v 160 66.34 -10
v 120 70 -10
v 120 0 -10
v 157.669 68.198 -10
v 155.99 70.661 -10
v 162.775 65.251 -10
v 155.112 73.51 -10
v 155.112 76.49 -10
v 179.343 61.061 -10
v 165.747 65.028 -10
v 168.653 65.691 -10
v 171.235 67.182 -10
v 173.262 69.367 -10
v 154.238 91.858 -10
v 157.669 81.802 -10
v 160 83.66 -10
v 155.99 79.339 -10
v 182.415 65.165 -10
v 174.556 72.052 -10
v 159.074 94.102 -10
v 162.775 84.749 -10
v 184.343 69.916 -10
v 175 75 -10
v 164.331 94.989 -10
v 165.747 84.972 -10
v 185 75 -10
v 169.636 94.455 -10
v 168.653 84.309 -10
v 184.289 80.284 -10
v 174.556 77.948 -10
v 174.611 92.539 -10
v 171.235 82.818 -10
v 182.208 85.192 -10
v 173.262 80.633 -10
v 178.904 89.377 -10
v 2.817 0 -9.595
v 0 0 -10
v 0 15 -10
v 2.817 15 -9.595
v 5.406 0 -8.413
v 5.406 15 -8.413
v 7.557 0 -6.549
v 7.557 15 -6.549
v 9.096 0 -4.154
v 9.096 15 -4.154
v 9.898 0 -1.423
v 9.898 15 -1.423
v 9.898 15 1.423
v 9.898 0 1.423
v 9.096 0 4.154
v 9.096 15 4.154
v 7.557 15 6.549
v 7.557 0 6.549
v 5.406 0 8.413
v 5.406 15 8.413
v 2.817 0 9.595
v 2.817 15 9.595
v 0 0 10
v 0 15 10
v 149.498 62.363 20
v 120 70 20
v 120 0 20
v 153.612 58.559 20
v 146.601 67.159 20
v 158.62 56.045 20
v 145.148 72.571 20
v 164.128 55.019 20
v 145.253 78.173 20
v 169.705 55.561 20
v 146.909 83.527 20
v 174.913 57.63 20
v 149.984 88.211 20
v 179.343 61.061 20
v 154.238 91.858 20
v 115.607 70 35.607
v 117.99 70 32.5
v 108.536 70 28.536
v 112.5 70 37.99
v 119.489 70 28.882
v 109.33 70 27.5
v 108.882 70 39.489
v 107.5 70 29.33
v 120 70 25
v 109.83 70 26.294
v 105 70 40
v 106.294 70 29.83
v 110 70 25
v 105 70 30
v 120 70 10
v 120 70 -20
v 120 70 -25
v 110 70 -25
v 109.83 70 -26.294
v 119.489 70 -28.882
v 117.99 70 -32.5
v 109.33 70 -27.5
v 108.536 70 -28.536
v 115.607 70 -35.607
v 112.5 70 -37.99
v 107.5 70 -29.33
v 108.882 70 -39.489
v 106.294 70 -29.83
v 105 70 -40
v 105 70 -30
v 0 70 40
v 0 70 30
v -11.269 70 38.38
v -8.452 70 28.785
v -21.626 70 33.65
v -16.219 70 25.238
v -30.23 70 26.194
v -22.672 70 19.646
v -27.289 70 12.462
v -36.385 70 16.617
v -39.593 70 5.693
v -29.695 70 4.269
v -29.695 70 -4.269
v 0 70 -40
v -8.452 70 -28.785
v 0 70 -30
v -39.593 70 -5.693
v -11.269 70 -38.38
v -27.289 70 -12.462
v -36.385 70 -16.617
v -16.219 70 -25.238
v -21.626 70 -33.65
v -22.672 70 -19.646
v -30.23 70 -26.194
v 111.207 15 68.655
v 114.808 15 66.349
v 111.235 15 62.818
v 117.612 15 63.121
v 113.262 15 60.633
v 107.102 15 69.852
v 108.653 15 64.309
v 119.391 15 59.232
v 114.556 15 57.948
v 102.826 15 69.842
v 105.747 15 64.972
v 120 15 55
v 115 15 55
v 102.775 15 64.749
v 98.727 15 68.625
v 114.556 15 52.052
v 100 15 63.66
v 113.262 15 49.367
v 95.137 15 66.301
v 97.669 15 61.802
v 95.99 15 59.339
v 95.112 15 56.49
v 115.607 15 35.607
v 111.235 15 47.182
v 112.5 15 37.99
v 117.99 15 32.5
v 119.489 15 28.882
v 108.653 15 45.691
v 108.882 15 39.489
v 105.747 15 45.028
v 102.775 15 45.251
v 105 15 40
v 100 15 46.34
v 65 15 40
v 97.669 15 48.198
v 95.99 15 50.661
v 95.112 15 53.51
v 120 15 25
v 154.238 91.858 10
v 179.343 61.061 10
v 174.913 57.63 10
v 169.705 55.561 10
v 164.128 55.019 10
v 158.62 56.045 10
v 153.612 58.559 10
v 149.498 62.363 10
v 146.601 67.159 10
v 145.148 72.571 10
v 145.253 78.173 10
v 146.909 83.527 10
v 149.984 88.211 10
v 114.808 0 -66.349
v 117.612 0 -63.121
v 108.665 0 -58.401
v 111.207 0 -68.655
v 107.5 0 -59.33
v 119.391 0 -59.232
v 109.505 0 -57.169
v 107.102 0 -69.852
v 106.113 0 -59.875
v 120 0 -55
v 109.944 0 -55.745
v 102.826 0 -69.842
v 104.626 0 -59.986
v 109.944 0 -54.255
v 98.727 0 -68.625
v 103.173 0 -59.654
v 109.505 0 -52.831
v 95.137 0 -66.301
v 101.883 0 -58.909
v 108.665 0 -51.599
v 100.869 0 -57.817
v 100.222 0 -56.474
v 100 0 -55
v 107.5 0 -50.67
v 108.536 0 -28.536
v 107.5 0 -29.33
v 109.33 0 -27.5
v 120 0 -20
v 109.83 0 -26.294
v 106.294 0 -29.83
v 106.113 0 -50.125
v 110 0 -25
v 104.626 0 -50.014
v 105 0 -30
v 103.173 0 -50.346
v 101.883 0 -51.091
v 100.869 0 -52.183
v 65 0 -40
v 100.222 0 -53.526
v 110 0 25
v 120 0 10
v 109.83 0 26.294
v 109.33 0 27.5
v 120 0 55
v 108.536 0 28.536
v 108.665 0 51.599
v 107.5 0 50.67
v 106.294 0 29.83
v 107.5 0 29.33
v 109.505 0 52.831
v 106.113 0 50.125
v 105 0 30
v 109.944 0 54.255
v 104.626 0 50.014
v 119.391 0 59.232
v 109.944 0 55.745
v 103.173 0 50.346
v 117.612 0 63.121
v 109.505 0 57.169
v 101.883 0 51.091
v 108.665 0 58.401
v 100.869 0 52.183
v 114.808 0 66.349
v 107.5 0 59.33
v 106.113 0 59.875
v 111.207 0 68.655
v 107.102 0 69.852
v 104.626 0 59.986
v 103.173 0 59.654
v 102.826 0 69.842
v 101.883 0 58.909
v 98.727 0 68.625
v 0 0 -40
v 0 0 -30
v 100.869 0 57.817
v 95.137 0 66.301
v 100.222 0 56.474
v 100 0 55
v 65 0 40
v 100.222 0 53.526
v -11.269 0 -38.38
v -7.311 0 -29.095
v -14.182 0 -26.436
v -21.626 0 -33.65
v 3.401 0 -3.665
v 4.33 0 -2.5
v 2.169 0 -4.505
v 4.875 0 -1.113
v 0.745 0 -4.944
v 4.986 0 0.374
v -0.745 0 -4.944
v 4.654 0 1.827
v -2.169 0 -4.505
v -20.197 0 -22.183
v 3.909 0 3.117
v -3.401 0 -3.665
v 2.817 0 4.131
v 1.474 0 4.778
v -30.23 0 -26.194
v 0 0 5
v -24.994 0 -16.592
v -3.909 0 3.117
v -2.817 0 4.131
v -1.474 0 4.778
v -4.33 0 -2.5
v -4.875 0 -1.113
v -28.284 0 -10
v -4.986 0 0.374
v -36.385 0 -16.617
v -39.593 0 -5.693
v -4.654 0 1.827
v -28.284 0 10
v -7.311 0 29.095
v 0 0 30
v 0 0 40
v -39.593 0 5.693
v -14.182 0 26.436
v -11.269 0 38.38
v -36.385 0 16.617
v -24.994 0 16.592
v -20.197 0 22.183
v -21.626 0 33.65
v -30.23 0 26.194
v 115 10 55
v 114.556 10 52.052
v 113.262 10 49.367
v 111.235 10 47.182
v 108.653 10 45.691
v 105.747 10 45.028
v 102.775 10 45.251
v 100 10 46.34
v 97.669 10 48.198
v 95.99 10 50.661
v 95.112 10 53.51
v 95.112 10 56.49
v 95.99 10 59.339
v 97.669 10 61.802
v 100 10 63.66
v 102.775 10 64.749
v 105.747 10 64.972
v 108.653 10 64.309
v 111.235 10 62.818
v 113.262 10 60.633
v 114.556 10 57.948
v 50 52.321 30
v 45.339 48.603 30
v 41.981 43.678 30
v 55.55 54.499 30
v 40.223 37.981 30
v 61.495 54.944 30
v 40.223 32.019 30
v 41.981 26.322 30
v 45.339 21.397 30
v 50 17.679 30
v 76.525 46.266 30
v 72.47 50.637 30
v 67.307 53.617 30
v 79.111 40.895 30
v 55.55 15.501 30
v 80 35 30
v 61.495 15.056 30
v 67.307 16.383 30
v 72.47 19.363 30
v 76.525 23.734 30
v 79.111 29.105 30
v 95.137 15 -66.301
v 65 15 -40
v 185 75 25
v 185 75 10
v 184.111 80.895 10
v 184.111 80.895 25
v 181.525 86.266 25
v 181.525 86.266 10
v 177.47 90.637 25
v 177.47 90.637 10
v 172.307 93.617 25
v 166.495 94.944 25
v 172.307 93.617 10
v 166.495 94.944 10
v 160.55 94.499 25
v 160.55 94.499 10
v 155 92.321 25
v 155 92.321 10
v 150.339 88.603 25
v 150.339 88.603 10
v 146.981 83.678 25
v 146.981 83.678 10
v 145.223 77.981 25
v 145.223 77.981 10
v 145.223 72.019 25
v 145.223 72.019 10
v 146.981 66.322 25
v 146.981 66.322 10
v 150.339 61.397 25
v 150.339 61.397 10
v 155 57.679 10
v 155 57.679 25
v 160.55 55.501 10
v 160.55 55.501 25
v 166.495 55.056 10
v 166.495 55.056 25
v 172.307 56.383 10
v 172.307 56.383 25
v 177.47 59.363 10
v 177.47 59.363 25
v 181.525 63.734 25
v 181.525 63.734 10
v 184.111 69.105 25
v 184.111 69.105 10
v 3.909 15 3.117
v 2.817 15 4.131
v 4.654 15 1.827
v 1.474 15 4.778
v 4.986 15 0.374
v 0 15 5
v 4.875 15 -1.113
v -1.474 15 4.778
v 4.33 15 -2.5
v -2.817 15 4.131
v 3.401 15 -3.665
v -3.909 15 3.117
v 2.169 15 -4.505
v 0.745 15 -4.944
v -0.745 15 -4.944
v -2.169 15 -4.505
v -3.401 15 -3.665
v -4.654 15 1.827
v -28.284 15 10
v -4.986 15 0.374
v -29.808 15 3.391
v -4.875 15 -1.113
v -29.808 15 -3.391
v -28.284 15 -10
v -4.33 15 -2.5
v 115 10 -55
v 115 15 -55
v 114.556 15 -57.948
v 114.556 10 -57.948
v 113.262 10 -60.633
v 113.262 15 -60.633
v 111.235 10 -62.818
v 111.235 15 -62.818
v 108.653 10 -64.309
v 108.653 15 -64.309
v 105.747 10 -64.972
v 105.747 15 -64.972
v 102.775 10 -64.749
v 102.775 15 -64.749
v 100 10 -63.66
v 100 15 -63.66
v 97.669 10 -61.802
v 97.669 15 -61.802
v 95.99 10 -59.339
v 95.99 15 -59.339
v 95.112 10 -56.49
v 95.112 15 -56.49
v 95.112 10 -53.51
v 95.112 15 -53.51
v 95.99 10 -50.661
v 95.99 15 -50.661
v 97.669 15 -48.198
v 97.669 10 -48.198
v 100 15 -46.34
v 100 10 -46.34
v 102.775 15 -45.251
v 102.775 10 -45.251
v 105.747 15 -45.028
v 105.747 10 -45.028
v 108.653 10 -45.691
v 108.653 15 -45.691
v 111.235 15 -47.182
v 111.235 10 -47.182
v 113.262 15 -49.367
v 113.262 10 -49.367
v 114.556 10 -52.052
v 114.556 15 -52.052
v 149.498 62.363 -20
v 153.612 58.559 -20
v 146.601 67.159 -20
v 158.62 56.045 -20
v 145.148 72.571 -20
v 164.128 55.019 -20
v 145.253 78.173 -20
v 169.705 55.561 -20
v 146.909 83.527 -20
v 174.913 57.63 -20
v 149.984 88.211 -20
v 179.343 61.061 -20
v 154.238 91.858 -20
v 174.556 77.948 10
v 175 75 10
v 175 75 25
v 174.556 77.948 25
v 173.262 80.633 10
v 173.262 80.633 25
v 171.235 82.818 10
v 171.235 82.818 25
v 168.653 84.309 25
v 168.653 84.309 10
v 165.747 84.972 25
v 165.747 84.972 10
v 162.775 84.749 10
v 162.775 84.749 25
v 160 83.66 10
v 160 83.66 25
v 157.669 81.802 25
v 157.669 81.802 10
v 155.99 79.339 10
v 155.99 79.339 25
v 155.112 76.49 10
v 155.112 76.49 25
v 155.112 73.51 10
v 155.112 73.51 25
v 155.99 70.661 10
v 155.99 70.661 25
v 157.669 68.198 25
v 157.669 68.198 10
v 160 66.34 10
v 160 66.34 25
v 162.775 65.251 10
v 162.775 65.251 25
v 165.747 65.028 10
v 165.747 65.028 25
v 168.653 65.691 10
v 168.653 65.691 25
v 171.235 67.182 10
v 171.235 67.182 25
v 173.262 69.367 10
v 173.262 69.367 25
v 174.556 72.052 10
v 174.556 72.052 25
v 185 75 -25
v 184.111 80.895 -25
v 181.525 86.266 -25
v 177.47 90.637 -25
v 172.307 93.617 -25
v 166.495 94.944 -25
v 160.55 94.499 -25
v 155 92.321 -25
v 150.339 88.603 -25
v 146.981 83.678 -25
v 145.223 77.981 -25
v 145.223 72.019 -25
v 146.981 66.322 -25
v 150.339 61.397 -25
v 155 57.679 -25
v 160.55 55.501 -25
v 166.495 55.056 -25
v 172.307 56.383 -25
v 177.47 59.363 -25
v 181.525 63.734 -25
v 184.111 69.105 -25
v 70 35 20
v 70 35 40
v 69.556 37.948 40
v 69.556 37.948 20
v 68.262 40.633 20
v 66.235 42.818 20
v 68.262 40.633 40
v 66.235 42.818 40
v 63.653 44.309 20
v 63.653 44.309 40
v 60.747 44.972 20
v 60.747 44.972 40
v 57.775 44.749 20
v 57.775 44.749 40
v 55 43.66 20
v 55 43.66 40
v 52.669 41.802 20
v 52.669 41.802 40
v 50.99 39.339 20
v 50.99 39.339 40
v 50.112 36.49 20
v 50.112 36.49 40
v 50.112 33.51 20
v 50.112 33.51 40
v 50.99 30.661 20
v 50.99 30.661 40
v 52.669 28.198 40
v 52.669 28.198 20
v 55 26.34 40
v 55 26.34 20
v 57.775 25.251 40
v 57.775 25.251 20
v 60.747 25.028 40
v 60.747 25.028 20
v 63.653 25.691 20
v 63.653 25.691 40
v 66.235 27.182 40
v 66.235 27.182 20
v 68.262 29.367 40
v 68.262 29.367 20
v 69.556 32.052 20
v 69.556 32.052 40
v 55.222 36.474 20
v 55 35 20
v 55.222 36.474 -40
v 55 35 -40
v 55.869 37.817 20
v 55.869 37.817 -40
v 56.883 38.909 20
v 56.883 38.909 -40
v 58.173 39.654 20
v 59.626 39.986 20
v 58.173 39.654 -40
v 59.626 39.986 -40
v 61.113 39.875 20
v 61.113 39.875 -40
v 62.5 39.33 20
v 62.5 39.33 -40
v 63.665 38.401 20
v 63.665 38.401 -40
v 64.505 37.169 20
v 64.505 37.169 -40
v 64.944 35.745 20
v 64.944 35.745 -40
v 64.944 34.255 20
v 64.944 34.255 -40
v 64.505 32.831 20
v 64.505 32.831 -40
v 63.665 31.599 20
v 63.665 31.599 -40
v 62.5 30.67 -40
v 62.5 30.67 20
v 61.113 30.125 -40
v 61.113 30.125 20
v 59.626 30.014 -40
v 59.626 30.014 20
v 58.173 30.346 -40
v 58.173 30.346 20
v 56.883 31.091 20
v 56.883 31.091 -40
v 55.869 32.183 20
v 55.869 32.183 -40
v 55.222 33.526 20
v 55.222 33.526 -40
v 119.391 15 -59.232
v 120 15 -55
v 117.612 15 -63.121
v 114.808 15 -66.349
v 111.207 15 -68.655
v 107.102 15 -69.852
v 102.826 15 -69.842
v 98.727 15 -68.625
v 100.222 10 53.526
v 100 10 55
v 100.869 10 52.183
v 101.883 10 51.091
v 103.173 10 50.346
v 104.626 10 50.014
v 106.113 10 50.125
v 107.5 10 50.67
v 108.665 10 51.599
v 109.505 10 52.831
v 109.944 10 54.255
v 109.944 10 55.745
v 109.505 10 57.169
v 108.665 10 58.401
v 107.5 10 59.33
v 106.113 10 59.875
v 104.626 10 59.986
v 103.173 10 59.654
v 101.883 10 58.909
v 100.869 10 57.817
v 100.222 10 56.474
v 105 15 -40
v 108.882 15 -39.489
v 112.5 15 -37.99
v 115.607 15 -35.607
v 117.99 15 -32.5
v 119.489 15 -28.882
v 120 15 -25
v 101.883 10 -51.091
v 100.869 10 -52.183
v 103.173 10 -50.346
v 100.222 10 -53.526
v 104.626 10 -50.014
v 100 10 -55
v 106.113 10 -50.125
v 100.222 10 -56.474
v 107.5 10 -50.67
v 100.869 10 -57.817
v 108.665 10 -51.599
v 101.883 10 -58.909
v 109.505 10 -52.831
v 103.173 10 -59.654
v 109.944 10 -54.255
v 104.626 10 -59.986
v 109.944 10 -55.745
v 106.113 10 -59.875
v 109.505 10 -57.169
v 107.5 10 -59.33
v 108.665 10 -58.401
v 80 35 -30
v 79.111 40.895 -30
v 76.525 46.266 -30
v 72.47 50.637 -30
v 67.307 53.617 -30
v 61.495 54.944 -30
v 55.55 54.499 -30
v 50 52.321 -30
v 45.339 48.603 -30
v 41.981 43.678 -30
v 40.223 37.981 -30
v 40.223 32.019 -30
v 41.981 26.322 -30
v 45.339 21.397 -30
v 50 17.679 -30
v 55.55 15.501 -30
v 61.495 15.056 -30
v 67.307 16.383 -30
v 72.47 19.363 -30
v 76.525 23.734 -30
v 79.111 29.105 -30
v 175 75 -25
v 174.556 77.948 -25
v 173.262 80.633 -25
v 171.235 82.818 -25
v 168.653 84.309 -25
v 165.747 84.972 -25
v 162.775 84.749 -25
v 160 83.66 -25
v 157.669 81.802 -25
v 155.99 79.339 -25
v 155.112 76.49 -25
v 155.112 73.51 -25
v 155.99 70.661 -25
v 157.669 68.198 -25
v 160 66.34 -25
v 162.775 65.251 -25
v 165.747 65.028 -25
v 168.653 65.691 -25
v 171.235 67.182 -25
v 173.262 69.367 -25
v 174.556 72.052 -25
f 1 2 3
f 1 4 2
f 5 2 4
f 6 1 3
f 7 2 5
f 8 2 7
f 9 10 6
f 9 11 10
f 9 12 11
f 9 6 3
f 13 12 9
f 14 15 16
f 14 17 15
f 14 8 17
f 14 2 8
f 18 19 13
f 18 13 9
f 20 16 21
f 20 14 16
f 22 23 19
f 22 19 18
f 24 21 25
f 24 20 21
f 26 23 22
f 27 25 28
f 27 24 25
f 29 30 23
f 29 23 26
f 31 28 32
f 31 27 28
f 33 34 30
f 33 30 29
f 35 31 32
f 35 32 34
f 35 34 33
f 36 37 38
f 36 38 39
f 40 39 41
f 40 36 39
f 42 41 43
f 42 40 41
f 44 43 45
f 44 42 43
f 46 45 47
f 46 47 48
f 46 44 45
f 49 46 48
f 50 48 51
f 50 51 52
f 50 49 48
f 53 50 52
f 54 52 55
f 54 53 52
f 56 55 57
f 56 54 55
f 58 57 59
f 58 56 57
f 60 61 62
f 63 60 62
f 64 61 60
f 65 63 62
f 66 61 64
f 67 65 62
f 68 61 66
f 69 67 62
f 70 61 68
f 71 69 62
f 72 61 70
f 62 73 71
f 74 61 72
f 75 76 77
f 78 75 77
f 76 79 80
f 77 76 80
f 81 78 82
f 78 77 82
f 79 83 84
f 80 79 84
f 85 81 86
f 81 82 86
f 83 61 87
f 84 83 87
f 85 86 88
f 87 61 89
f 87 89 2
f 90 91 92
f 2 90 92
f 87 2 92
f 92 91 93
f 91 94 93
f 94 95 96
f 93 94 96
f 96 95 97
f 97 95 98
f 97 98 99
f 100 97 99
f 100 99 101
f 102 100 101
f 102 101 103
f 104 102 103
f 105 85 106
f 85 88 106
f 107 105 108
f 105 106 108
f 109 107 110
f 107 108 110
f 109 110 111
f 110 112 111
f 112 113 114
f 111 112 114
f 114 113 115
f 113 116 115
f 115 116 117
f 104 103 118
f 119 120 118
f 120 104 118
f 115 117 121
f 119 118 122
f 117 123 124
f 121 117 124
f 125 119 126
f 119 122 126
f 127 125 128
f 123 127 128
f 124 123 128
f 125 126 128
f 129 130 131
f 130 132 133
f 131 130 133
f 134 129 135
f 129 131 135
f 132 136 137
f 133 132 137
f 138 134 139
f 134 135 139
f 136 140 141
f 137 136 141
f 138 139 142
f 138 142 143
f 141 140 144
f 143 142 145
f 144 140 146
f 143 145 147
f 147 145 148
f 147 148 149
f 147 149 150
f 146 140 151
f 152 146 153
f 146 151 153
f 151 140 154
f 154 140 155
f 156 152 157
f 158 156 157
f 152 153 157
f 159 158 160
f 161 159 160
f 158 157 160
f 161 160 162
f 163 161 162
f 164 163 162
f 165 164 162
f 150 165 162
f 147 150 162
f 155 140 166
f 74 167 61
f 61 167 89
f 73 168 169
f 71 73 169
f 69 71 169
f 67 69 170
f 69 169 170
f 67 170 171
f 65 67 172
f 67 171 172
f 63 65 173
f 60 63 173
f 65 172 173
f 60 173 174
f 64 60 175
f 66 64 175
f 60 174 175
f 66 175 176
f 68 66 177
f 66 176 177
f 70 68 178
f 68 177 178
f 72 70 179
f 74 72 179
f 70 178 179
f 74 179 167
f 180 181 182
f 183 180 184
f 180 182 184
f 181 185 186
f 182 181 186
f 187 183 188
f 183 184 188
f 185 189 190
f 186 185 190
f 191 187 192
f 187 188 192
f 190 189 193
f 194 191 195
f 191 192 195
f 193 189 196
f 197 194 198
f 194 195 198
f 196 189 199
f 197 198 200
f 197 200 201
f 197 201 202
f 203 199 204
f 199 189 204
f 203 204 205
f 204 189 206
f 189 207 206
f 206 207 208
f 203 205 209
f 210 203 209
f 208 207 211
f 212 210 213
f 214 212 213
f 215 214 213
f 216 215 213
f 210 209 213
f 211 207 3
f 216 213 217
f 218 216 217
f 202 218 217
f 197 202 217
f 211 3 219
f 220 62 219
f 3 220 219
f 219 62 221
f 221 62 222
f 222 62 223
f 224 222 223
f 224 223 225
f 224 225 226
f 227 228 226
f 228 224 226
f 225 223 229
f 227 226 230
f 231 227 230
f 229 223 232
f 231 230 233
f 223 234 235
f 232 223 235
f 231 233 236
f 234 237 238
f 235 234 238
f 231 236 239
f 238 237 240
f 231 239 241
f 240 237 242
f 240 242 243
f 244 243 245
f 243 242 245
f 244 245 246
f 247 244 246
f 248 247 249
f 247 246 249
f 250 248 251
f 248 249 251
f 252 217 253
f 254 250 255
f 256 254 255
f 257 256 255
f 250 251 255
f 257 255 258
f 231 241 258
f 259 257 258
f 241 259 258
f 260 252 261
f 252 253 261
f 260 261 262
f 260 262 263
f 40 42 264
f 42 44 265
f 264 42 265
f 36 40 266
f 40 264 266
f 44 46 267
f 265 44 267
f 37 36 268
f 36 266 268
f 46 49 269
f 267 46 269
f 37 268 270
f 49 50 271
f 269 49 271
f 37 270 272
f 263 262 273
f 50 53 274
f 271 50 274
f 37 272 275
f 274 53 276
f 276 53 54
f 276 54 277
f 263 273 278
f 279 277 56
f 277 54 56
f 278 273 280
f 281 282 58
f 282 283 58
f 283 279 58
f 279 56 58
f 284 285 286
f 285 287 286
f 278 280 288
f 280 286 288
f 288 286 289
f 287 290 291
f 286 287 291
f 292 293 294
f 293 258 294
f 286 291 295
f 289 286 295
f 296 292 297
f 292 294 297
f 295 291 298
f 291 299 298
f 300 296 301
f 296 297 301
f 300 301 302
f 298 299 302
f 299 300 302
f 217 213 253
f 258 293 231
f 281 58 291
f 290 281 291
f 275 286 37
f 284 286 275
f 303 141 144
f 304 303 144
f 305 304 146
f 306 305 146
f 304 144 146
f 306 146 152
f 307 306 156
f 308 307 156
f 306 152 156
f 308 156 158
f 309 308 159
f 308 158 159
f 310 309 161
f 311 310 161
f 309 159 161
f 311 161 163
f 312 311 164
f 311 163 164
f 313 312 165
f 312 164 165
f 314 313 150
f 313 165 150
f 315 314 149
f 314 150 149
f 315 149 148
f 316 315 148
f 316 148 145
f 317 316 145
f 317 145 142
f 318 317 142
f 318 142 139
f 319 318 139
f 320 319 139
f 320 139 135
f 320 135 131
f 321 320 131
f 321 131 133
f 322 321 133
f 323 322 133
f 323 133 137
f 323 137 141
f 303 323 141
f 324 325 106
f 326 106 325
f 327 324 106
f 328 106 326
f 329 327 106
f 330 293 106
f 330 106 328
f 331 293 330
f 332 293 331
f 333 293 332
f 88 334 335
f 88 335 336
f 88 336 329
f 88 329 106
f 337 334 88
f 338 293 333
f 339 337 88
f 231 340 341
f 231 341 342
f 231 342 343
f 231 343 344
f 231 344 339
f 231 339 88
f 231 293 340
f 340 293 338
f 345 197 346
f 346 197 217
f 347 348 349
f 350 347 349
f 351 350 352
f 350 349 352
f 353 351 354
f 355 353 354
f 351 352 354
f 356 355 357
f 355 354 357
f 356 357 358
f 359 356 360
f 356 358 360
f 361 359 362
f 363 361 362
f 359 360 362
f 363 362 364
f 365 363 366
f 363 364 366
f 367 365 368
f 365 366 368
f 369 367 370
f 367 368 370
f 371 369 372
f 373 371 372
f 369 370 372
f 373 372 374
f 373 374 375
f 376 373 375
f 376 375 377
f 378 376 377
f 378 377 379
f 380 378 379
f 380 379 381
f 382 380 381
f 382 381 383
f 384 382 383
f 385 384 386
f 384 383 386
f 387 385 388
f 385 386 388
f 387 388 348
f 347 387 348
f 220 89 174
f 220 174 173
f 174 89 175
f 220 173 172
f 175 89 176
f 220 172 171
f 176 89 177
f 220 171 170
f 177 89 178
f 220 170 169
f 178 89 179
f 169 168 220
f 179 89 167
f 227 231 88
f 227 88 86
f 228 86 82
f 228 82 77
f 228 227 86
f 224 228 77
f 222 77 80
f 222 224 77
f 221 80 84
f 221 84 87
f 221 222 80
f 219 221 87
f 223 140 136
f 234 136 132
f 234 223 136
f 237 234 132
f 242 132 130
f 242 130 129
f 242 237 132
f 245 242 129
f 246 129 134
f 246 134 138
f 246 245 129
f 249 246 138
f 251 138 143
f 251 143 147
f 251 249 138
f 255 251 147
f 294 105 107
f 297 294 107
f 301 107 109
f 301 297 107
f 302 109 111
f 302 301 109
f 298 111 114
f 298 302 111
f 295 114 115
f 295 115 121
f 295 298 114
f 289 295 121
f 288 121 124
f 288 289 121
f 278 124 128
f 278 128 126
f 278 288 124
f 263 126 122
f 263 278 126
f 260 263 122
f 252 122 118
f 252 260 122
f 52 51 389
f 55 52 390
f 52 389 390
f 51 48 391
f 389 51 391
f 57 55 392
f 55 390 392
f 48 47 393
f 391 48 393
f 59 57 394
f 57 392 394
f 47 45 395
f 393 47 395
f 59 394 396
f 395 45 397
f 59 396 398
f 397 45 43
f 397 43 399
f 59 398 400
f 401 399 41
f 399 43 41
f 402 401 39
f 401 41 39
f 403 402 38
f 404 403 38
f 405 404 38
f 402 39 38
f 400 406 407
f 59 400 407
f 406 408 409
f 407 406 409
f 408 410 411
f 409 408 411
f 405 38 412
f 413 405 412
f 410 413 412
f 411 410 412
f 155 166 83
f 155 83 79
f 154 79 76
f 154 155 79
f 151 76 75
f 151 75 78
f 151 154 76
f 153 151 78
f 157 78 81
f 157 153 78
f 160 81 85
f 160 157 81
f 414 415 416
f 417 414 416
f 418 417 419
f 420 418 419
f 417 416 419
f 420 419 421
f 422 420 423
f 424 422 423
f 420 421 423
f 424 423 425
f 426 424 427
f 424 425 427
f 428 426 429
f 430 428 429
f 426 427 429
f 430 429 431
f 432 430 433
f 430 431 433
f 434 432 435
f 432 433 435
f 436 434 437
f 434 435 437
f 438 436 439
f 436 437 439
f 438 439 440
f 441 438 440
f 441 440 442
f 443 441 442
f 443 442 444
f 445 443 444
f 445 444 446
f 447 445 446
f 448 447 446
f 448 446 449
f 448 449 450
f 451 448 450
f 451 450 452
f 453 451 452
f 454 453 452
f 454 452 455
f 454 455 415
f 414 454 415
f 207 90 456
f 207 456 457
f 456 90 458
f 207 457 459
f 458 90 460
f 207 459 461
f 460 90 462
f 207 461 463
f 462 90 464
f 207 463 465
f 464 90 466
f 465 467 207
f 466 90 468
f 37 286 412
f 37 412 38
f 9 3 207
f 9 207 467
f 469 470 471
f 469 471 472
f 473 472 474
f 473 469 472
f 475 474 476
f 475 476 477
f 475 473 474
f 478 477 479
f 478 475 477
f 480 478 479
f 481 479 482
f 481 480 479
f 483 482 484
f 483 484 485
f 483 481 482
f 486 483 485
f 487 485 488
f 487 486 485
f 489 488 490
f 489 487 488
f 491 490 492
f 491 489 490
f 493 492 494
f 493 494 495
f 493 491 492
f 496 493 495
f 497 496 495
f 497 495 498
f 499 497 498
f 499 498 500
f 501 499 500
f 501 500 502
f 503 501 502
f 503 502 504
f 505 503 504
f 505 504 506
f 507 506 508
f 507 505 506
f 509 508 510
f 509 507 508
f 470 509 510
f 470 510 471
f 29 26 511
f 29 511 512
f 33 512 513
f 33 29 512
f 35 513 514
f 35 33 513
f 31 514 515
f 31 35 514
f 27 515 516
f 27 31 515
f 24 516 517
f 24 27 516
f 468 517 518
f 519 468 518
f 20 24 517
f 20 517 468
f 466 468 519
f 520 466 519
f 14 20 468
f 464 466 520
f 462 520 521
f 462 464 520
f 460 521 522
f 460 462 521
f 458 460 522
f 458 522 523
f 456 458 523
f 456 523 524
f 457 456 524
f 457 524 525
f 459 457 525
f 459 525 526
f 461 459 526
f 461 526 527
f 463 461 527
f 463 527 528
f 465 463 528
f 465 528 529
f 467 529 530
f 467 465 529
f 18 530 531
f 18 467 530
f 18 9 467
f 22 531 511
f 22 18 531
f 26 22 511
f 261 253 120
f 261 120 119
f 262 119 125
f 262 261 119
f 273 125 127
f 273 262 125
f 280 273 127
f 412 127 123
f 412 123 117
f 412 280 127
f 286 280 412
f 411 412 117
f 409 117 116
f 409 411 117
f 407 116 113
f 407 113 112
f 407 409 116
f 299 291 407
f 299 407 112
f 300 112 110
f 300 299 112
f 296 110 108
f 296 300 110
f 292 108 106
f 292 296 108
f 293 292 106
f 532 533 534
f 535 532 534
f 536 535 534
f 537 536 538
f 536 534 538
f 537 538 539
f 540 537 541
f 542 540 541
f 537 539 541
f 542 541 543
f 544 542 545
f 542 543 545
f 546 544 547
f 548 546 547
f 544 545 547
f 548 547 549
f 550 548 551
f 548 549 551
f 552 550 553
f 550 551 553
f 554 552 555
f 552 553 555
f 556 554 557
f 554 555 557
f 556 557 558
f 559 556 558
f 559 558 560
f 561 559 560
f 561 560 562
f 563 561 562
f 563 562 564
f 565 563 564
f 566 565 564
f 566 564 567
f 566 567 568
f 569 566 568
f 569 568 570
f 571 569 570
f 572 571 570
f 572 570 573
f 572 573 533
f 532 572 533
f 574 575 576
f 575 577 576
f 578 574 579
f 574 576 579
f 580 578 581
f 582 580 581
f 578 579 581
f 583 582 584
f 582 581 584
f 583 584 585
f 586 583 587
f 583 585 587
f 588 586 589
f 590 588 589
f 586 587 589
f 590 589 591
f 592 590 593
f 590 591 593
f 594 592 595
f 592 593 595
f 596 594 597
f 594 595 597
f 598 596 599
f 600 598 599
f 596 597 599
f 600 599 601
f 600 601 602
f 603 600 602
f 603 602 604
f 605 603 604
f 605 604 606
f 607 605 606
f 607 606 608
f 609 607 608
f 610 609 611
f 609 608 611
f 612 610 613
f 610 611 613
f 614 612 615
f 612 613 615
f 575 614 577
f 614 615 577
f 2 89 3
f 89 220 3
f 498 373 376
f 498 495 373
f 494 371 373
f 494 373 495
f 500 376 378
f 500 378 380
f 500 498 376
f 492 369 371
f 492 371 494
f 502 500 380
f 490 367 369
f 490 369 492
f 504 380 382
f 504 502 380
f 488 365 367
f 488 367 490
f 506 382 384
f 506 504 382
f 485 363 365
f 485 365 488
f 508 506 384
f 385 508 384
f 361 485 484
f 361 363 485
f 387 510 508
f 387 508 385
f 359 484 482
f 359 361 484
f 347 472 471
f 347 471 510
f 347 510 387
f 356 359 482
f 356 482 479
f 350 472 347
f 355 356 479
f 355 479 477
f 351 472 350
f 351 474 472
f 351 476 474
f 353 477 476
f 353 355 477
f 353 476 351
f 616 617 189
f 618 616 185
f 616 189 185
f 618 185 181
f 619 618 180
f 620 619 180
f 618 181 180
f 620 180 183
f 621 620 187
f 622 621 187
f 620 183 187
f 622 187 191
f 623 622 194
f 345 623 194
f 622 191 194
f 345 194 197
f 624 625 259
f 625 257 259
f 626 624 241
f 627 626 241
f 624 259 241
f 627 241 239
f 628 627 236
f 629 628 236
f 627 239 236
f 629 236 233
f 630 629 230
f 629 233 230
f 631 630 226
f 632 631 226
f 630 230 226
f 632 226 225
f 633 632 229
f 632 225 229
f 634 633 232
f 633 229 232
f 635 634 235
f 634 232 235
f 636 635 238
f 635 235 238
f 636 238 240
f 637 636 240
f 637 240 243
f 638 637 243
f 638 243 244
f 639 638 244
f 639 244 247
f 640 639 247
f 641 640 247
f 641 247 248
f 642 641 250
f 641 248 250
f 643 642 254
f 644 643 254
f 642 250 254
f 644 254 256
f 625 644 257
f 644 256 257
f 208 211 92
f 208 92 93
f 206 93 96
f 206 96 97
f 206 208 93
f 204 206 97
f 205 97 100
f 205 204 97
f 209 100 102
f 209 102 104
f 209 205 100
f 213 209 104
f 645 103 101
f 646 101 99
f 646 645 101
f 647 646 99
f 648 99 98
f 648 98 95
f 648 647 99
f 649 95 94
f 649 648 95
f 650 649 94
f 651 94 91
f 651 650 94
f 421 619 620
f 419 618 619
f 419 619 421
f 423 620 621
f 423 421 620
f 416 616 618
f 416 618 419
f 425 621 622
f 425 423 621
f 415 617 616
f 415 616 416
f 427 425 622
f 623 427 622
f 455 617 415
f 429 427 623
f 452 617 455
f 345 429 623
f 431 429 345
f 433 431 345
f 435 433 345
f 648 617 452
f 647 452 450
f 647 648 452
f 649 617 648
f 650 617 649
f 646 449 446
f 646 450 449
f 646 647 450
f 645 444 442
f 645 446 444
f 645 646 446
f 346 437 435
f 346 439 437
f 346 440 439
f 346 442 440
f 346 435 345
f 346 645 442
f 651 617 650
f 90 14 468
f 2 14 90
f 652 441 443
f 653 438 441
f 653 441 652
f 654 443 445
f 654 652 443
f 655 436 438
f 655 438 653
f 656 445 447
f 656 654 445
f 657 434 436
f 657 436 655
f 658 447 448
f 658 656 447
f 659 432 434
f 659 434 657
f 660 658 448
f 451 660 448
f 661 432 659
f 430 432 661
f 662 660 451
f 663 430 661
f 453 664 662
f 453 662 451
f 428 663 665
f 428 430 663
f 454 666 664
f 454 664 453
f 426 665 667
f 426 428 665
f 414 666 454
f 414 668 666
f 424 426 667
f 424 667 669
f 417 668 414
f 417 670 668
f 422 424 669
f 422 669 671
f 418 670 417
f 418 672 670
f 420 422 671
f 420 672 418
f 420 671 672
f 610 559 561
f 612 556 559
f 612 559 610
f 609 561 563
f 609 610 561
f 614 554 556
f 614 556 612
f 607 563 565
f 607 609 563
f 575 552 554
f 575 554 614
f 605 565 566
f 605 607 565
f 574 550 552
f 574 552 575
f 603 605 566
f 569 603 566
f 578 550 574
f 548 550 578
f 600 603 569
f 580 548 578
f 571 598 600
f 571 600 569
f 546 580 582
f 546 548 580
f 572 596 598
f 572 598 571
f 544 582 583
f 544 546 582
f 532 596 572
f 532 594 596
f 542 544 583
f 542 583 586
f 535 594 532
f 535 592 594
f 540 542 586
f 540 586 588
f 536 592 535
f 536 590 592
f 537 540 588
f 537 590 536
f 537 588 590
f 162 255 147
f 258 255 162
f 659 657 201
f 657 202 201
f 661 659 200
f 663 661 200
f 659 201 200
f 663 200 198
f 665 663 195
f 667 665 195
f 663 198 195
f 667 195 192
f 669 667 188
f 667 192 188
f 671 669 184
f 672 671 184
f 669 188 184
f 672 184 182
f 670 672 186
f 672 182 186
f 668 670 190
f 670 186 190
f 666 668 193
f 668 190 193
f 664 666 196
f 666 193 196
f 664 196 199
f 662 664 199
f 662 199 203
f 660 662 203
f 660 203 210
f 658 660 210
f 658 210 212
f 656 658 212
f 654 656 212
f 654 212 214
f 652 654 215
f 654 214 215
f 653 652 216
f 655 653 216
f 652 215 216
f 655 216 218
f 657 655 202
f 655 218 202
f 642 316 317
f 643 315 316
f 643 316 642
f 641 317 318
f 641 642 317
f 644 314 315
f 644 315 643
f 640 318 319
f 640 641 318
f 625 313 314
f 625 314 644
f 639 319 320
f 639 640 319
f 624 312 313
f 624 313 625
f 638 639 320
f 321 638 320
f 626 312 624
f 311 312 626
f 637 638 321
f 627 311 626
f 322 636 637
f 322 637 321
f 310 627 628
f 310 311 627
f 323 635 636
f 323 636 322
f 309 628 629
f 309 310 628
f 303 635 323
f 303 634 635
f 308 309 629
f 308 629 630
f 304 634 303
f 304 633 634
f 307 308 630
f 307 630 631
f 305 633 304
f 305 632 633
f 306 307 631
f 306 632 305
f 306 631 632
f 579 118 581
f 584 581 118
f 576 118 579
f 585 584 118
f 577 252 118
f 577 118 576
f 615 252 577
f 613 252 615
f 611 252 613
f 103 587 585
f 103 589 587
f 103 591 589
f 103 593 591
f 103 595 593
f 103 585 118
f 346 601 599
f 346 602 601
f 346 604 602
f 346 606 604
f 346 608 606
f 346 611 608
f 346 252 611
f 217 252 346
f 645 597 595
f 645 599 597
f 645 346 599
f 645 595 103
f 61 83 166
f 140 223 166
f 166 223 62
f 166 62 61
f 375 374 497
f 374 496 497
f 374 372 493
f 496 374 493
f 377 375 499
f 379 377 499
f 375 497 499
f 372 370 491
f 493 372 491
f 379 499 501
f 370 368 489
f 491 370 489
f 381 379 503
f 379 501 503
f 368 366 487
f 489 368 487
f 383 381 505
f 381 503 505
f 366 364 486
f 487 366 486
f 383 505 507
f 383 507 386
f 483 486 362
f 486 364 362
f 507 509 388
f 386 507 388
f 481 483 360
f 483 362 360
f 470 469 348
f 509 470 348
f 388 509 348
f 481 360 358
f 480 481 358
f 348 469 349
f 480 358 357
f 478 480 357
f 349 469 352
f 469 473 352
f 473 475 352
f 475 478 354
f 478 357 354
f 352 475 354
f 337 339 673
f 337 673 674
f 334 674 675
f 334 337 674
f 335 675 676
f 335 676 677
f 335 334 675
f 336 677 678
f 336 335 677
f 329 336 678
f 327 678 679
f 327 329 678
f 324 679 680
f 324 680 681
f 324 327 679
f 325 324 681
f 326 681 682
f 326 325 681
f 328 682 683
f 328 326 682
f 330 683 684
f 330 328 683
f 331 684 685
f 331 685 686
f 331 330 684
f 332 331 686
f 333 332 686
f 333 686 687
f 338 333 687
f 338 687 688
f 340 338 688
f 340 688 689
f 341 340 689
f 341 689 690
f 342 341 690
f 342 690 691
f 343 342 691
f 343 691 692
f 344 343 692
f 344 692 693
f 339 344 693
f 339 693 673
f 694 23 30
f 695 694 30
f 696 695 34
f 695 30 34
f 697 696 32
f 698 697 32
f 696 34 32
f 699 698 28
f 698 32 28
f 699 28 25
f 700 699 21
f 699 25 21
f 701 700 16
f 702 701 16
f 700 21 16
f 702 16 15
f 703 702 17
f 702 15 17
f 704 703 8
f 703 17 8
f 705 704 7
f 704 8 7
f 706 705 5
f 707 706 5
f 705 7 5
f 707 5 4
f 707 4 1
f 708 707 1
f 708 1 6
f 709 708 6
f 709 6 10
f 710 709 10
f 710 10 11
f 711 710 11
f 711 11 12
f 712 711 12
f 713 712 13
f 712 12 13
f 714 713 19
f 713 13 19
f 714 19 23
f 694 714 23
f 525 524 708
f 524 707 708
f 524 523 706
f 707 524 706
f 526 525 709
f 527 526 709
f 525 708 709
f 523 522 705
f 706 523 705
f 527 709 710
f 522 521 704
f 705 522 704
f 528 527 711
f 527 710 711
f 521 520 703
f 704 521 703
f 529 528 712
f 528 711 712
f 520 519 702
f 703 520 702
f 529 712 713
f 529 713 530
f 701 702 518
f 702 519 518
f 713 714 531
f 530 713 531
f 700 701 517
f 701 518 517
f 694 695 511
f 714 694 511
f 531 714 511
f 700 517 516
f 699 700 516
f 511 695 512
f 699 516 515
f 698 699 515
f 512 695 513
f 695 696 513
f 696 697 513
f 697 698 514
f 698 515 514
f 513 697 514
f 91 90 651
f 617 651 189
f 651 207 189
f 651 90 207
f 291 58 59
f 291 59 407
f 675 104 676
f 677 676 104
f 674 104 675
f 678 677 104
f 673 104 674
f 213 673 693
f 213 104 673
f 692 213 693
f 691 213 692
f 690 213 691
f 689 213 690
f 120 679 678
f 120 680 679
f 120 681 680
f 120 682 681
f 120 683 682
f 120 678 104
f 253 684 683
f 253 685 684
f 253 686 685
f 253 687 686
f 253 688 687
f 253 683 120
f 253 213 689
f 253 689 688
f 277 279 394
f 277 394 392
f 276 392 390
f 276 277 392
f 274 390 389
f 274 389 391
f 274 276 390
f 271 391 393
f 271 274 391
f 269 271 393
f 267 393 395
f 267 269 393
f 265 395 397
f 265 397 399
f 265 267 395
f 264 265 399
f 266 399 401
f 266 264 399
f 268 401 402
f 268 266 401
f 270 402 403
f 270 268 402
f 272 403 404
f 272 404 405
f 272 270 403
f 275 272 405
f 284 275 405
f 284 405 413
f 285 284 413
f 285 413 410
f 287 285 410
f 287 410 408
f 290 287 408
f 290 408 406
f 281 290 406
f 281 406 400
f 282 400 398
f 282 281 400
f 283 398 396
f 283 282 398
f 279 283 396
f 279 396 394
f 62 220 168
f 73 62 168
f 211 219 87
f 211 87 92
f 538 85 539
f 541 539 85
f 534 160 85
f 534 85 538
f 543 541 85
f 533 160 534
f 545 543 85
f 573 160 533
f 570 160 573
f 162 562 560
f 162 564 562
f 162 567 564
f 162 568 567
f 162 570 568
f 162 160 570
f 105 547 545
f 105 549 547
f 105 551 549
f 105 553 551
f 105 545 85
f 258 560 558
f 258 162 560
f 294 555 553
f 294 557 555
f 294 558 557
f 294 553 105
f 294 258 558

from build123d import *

# Parameters (mm, degrees)
BOSS_EXTRUDE1_DEPTH = 70
BOSS_EXTRUDE2_REACH = 162.312
SKETCH2_R           = 20
BOSS_EXTRUDE3_DEPTH = 15
HOLE1_D             = 10
HOLE1_CBORE_D       = 20
HOLE1_CBORE_DEPTH   = 5
HOLE2_D             = 10
HOLE2_CBORE_D       = 20
HOLE2_CBORE_DEPTH   = 20
BOSS_EXTRUDE4_START = 10
SKETCH10_R          = 20
SKETCH10_R_2        = 10
BOSS_EXTRUDE4_DEPTH = 15
BOSS_EXTRUDE5_START = -10
SKETCH11_R          = 20
SKETCH11_R_2        = 10
BOSS_EXTRUDE5_DEPTH = 15
BOSS_EXTRUDE6_DEPTH = 10
SKETCH13_R          = 5
BOSS_EXTRUDE7_DEPTH = 15


with BuildPart() as part:
    # Sketch1 → Boss-Extrude1 (new body)
    with BuildSketch(Plane(origin=(0, 0, 0), x_dir=(1, 0, 0), z_dir=(0, 1, 0))):
        with BuildLine():
            Line((0, 40), (105, 40))
            ThreePointArc((105, 40), (115.606601718, 35.606601718), (120, 25))
            Line((120, 25), (120, -25))
            ThreePointArc((120, -25), (115.606601718, -35.606601718), (105, -40))
            Line((105, -40), (0, -40))
            ThreePointArc((0, -40), (-40, 0), (0, 40))
        make_face()
        with BuildLine():
            Line((0, -30), (105, -30))
            ThreePointArc((105, -30), (108.535533906, -28.535533906), (110, -25))
            Line((110, -25), (110, 25))
            ThreePointArc((110, 25), (108.535533906, 28.535533906), (105, 30))
            Line((105, 30), (0, 30))
            ThreePointArc((0, 30), (-30, 0), (0, -30))
        make_face(mode=Mode.SUBTRACT)
    extrude(amount=BOSS_EXTRUDE1_DEPTH)

    # Sketch2 → Boss-Extrude2 (add, up to next)
    with BuildSketch(Plane.XY.offset(40), mode=Mode.PRIVATE) as boss_extrude2_sk1:
        with Locations((60, 35)):
            Circle(SKETCH2_R)
    boss_extrude2_tool1 = extrude(boss_extrude2_sk1.sketch, amount=-BOSS_EXTRUDE2_REACH, mode=Mode.PRIVATE) - part.part
    add(boss_extrude2_tool1.solids().sort_by_distance((60, 35, 40))[0])

    # Sketch3 → Boss-Extrude3 (add)
    with BuildSketch(Plane(origin=(0, 0, 0), x_dir=(1, 0, 0), z_dir=(0, 1, 0))):
        with BuildLine():
            Line((120, -25), (120, -55))
            ThreePointArc((120, -55), (111.207044165, -68.655497162), (95.136986301, -66.301369863))
            Line((95.136986301, -66.301369863), (65, -40))
            Line((65, -40), (105, -40))
            ThreePointArc((105, -40), (115.606601718, -35.606601718), (120, -25))
        make_face()
    boss_extrude3 = extrude(amount=BOSS_EXTRUDE3_DEPTH)

    # Mirror1: Boss-Extrude3 across plane
    add(boss_extrude3.mirror(Plane.XY))

    # Hole1 (through all)
    with Locations(Plane(origin=(0, 15, 0), x_dir=(1, 0, 0), z_dir=(0, 1, 0))):
        with Locations((105, -55), (105, 55)):
            CounterBoreHole(HOLE1_D / 2, HOLE1_CBORE_D / 2, HOLE1_CBORE_DEPTH)

    # Hole2 (through all)
    with Locations(Plane.XY.offset(40)):
        with Locations((60, 35)):
            CounterBoreHole(HOLE2_D / 2, HOLE2_CBORE_D / 2, HOLE2_CBORE_DEPTH)



with BuildPart() as body_2:
    # Sketch10 → Boss-Extrude4 (new body)
    with BuildSketch(Plane.XY.offset(BOSS_EXTRUDE4_START)):
        with Locations((165, 75)):
            Circle(SKETCH10_R)
        with Locations((165, 75)):
            Circle(SKETCH10_R_2, mode=Mode.SUBTRACT)
    extrude(amount=BOSS_EXTRUDE4_DEPTH)


with BuildPart() as body_3:
    # Sketch11 → Boss-Extrude5 (new body)
    with BuildSketch(Plane.XY.offset(BOSS_EXTRUDE5_START)):
        with Locations((165, 75)):
            Circle(SKETCH11_R)
        with Locations((165, 75)):
            Circle(SKETCH11_R_2, mode=Mode.SUBTRACT)
    extrude(amount=-BOSS_EXTRUDE5_DEPTH)


with BuildPart() as part_1:
    add(part.part)

    add(body_3.part)  # Boss-Extrude6 merges body 3
    # Sketch12 → Boss-Extrude6 (add)
    with BuildSketch(Plane.XY.offset(-10)):
        with BuildLine():
            Line((120, 15), (120, 0))
            Line((120, 0), (179.342535653, 61.061145275))
            ThreePointArc((179.342535653, 61.061145275), (149.498024882, 62.363197895), (154.238039414, 91.857645278))
            Line((154.238039414, 91.857645278), (120, 70))
            Line((120, 70), (120, 15))
        make_face()
    boss_extrude6 = extrude(amount=-BOSS_EXTRUDE6_DEPTH)

    # Mirror7: Boss-Extrude6 across plane
    add(boss_extrude6.mirror(Plane.XY))

    # Sketch13 → Boss-Extrude7 (add)
    with BuildSketch(Plane(origin=(0, 0, 0), x_dir=(1, 0, 0), z_dir=(0, 1, 0))):
        with BuildLine():
            Line((-28.284271247, 10), (0, 10))
            ThreePointArc((0, 10), (10, 0), (0, -10))
            Line((0, -10), (-28.284271247, -10))
            ThreePointArc((-28.284271247, -10), (-30, 0), (-28.284271247, 10))
        make_face()
        with Locations(Location((0, 0, 0), (0, 0, 270))):
            Circle(SKETCH13_R, mode=Mode.SUBTRACT)
    extrude(amount=BOSS_EXTRUDE7_DEPTH)


solid = Compound([body_2.part, part_1.part])
